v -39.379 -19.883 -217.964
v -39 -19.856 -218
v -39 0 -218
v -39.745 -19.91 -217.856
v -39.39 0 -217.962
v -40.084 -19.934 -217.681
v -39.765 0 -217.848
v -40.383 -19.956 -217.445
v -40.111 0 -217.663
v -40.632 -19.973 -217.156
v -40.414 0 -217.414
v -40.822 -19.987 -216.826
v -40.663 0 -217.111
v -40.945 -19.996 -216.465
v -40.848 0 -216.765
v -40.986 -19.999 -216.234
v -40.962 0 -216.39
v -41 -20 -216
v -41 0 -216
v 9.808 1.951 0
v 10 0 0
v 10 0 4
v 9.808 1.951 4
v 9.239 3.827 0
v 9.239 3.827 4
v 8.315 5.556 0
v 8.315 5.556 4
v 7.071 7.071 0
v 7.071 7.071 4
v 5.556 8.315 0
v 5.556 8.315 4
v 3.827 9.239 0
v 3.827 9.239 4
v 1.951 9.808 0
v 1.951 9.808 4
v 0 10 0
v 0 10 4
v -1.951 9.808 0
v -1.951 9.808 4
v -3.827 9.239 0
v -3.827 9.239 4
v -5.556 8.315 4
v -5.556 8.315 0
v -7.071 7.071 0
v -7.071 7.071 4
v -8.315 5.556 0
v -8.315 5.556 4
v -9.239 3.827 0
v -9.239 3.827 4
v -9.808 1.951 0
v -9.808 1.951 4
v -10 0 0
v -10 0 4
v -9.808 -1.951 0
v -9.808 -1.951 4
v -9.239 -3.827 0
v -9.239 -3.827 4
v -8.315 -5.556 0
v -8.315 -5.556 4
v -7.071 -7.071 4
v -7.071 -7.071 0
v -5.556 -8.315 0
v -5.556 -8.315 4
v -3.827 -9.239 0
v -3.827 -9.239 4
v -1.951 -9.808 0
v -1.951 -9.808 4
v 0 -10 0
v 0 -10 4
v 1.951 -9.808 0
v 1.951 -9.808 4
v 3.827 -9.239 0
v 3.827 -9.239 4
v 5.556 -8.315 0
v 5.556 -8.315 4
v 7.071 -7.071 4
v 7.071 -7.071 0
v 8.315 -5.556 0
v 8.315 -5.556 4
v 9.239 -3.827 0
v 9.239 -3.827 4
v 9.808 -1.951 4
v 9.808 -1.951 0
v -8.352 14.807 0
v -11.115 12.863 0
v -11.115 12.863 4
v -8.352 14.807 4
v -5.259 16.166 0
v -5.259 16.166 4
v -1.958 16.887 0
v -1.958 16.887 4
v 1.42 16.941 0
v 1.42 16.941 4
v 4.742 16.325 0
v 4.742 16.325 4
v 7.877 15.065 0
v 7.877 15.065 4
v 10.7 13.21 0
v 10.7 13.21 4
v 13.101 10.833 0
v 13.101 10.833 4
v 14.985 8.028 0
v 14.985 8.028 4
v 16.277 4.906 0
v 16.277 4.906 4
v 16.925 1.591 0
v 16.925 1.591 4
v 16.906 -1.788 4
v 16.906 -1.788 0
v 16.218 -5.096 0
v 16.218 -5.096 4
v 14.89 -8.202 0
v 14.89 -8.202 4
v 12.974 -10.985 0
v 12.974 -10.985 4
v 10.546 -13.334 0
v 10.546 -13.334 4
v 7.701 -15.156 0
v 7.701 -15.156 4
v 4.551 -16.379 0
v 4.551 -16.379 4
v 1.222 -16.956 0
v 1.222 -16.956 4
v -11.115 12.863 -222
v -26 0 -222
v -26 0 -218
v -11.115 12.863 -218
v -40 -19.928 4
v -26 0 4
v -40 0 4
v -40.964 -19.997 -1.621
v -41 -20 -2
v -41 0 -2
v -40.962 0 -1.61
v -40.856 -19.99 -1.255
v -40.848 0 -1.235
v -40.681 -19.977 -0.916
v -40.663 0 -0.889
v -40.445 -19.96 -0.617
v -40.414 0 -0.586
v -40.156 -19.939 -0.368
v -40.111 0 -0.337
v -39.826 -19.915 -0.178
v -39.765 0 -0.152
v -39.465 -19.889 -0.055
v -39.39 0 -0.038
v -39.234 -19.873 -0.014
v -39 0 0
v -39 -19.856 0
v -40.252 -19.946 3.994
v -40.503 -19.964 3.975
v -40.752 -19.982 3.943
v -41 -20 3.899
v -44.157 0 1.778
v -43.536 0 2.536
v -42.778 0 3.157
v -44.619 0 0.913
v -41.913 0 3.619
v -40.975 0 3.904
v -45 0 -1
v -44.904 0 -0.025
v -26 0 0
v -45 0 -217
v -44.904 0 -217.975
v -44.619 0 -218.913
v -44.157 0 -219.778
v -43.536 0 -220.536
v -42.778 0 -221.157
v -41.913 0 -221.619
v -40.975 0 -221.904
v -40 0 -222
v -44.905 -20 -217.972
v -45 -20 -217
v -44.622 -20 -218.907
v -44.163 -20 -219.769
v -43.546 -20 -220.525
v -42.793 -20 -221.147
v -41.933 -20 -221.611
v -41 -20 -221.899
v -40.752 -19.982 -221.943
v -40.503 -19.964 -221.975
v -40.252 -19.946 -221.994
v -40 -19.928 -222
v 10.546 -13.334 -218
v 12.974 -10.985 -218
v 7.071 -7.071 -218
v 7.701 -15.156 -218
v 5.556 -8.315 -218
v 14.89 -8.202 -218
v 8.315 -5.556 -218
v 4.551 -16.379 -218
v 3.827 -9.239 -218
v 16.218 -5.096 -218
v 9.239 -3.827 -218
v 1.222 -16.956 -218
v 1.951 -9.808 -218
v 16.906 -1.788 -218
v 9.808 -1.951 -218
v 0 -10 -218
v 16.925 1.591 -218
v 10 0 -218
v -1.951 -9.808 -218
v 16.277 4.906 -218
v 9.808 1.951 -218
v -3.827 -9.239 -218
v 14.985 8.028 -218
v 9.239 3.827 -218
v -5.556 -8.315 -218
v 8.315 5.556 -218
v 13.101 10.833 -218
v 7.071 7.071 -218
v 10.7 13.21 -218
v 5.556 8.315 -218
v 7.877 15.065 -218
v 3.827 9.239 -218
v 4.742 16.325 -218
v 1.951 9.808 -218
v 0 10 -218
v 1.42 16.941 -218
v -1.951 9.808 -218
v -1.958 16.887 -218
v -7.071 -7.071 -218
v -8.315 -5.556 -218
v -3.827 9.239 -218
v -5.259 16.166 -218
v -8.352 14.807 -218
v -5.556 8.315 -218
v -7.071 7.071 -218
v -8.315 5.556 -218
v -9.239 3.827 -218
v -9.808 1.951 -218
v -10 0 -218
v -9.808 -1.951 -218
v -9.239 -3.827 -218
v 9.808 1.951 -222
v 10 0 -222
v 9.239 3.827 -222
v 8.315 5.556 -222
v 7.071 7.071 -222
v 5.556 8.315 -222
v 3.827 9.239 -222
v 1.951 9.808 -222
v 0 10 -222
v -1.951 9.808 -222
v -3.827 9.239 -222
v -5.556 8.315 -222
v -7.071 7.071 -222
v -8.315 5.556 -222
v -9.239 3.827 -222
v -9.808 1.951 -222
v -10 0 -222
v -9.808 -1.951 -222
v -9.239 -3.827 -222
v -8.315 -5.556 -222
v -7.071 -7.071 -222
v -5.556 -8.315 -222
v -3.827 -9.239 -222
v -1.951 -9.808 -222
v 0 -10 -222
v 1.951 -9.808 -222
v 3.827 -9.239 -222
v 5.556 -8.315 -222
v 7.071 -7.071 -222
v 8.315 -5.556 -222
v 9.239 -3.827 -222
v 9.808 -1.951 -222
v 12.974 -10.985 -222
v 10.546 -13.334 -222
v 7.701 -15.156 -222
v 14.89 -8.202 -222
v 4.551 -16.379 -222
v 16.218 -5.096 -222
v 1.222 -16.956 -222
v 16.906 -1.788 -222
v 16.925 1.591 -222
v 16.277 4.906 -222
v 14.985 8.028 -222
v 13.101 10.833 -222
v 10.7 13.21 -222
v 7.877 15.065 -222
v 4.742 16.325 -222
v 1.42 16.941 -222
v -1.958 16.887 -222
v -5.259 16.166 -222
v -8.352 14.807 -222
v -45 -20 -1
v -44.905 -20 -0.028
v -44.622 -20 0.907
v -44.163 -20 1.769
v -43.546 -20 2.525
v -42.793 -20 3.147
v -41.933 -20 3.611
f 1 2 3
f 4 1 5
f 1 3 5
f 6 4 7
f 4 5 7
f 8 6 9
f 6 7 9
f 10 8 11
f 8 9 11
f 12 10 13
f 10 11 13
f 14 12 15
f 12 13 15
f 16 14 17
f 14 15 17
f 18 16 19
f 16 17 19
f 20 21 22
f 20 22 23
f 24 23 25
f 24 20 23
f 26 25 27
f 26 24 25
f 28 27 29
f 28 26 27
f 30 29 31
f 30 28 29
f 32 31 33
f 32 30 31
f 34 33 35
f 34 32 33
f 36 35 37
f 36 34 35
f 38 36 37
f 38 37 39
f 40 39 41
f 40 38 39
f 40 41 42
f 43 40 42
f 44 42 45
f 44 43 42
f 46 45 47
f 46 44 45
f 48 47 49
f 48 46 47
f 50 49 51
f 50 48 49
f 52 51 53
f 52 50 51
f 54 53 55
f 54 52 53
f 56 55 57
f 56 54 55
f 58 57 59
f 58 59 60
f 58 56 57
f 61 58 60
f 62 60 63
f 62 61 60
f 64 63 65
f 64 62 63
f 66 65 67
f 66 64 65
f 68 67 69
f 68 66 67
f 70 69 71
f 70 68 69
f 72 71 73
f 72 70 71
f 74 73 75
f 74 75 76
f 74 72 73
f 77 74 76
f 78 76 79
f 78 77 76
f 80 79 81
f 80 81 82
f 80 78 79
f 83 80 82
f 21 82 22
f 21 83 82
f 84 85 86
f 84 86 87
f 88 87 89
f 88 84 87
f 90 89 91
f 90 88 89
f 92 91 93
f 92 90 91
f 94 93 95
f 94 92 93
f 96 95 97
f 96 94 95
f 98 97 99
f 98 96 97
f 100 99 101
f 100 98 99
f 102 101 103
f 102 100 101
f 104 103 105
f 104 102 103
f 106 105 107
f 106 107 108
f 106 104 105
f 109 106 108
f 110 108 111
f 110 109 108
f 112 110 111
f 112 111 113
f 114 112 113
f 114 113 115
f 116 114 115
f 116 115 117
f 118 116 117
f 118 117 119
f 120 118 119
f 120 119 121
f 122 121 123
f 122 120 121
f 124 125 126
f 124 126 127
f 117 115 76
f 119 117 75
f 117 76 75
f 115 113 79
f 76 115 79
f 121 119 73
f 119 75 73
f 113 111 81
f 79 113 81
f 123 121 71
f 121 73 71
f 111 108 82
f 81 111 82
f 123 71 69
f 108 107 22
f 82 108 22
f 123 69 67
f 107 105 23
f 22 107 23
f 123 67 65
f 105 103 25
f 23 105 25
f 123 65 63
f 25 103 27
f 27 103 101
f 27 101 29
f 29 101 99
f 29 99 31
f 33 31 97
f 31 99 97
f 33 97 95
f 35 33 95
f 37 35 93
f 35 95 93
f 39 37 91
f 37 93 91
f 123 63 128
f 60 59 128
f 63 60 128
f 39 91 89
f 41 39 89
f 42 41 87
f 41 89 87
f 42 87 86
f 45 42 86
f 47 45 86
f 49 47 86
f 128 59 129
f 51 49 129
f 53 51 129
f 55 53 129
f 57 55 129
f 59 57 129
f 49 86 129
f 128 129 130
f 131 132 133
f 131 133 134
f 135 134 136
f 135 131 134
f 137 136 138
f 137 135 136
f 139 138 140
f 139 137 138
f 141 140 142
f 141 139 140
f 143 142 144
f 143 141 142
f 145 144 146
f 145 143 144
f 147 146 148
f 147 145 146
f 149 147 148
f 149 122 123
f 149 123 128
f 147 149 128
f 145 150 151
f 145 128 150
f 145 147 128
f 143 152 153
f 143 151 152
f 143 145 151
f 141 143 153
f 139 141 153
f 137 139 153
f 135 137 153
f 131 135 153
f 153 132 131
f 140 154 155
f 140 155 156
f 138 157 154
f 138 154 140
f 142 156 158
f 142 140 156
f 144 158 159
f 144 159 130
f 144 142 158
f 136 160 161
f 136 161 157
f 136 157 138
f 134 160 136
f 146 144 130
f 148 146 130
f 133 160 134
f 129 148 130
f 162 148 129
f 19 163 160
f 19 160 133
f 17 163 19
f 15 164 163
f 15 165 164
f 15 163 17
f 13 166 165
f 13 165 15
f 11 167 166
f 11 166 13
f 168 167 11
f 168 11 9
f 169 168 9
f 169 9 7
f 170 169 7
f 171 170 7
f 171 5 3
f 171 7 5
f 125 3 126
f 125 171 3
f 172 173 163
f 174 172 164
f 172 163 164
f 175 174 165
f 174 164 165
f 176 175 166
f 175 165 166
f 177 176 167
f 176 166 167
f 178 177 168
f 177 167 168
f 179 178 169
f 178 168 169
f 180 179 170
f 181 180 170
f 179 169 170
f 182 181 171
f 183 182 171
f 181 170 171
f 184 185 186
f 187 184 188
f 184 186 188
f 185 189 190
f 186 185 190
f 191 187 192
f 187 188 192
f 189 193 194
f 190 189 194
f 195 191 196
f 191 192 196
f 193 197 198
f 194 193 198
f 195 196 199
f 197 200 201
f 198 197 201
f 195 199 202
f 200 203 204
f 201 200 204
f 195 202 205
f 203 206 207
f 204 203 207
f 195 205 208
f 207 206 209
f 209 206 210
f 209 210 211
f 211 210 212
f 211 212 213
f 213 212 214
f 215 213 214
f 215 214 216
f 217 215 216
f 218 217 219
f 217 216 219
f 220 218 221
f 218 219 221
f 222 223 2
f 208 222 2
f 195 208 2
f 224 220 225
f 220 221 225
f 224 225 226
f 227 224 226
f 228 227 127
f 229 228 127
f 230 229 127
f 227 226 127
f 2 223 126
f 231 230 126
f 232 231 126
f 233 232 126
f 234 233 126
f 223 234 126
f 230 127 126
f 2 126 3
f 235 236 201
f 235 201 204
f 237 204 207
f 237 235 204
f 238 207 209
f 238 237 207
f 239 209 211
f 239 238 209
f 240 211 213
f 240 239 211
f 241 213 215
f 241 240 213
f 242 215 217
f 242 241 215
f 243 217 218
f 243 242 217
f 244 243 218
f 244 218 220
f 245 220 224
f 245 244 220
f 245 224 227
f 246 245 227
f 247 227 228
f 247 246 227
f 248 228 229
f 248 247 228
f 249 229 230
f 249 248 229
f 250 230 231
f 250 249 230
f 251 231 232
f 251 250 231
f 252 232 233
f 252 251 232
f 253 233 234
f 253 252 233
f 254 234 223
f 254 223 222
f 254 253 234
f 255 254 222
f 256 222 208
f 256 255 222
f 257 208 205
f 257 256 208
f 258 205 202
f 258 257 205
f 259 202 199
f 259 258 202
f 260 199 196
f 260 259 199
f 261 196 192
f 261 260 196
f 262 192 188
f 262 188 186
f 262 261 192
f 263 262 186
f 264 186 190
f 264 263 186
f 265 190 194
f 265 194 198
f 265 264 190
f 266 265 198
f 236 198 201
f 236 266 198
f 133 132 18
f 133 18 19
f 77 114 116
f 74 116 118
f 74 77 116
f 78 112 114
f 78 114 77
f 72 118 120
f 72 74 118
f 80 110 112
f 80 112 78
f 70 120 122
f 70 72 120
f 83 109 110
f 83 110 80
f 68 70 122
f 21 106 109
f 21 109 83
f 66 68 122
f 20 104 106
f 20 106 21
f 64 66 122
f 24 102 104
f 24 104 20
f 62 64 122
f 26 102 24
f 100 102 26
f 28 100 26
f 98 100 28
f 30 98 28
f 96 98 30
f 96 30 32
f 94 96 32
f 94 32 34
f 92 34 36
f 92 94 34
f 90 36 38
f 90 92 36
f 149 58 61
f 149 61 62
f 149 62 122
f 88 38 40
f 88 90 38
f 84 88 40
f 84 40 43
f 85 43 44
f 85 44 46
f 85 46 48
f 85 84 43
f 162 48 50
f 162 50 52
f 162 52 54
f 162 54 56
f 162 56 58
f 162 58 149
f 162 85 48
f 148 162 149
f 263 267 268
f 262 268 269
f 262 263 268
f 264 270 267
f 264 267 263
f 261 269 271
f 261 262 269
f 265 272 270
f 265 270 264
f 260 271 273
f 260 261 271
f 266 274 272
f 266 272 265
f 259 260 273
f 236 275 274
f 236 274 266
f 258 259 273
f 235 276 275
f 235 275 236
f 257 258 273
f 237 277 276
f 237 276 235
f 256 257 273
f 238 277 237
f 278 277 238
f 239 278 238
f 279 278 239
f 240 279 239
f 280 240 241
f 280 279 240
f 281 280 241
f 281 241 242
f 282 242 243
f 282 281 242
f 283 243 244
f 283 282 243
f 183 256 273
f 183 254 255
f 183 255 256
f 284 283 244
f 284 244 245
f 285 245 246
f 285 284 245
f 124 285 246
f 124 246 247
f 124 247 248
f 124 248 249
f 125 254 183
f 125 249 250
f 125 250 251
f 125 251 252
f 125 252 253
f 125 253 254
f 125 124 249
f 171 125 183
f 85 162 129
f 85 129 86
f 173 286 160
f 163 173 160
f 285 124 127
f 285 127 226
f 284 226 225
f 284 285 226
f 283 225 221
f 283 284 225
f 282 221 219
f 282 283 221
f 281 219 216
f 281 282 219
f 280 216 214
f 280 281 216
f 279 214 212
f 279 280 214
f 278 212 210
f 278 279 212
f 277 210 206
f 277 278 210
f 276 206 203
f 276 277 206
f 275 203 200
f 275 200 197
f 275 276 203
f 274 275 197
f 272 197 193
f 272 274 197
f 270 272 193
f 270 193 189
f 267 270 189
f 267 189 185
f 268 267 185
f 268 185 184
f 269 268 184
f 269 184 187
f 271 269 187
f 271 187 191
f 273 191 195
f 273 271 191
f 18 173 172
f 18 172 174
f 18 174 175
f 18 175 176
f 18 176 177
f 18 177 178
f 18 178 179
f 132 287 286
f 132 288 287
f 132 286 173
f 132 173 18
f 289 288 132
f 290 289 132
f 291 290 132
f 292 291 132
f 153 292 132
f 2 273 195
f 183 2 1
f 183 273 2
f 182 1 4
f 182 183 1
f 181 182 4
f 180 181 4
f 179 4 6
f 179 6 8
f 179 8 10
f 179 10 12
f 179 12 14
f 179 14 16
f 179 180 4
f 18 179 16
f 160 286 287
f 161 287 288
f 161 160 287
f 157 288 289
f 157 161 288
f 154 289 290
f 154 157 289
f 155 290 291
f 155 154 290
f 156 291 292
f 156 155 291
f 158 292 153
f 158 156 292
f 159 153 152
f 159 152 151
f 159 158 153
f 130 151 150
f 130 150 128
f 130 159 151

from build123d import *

# Parameters (mm, degrees)
SCHIZZO1_R             = 10
ESTRUSIONE1_DEPTH      = 4
SCHIZZO2_W             = 4
SCHIZZO2_H             = 20
ESTRUSIONE2_DEPTH      = 226
RIPETIZIONE_A_L1_COUNT = 2
RIPETIZIONE_A_L1_PITCH = 222
RACCORDO1_R            = 5
RACCORDO2_R            = 2


with BuildPart() as part:
    # Schizzo1 → Estrusione1 (new body)
    with BuildSketch(Plane.XY):
        with BuildLine():
            Line((-26, 0), (-11.115384615, 12.862667875))
            ThreePointArc((-11.115384615, 12.862667875), (15.70846037, 6.499559431), (1.222434951, -16.955991649))
            Line((1.222434951, -16.955991649), (-41, -20))
            Line((-41, -20), (-45, -20))
            Line((-45, -20), (-45, 0))
            Line((-45, 0), (-26, 0))
        make_face()
        Circle(SCHIZZO1_R, mode=Mode.SUBTRACT)
    estrusione1 = extrude(amount=ESTRUSIONE1_DEPTH)

    # Schizzo2 → Estrusione2 (add)
    with BuildSketch(Plane.XY.offset(4)):
        with Locations((-43, -10)):
            Rectangle(SCHIZZO2_W, SCHIZZO2_H)
    extrude(amount=-ESTRUSIONE2_DEPTH)

    # Ripetizione a L1: Estrusione1 ×2
    with Locations(*[(0, 0, -i * RIPETIZIONE_A_L1_PITCH) for i in range(1, RIPETIZIONE_A_L1_COUNT)]):
        add(estrusione1)

    # Raccordo1
    raccordo1_edges = [part.edges().sort_by_distance(p)[0] for p in [
        (-45, -10, -222),
        (-45, -10, 4),
    ]]
    fillet(raccordo1_edges, radius=RACCORDO1_R)

    # Raccordo2
    raccordo2_edges = [part.edges().sort_by_distance(p)[0] for p in [
        (-41, -10, 0),
        (-41, -10, -218),
    ]]
    fillet(raccordo2_edges, radius=RACCORDO2_R)


solid = part.part
